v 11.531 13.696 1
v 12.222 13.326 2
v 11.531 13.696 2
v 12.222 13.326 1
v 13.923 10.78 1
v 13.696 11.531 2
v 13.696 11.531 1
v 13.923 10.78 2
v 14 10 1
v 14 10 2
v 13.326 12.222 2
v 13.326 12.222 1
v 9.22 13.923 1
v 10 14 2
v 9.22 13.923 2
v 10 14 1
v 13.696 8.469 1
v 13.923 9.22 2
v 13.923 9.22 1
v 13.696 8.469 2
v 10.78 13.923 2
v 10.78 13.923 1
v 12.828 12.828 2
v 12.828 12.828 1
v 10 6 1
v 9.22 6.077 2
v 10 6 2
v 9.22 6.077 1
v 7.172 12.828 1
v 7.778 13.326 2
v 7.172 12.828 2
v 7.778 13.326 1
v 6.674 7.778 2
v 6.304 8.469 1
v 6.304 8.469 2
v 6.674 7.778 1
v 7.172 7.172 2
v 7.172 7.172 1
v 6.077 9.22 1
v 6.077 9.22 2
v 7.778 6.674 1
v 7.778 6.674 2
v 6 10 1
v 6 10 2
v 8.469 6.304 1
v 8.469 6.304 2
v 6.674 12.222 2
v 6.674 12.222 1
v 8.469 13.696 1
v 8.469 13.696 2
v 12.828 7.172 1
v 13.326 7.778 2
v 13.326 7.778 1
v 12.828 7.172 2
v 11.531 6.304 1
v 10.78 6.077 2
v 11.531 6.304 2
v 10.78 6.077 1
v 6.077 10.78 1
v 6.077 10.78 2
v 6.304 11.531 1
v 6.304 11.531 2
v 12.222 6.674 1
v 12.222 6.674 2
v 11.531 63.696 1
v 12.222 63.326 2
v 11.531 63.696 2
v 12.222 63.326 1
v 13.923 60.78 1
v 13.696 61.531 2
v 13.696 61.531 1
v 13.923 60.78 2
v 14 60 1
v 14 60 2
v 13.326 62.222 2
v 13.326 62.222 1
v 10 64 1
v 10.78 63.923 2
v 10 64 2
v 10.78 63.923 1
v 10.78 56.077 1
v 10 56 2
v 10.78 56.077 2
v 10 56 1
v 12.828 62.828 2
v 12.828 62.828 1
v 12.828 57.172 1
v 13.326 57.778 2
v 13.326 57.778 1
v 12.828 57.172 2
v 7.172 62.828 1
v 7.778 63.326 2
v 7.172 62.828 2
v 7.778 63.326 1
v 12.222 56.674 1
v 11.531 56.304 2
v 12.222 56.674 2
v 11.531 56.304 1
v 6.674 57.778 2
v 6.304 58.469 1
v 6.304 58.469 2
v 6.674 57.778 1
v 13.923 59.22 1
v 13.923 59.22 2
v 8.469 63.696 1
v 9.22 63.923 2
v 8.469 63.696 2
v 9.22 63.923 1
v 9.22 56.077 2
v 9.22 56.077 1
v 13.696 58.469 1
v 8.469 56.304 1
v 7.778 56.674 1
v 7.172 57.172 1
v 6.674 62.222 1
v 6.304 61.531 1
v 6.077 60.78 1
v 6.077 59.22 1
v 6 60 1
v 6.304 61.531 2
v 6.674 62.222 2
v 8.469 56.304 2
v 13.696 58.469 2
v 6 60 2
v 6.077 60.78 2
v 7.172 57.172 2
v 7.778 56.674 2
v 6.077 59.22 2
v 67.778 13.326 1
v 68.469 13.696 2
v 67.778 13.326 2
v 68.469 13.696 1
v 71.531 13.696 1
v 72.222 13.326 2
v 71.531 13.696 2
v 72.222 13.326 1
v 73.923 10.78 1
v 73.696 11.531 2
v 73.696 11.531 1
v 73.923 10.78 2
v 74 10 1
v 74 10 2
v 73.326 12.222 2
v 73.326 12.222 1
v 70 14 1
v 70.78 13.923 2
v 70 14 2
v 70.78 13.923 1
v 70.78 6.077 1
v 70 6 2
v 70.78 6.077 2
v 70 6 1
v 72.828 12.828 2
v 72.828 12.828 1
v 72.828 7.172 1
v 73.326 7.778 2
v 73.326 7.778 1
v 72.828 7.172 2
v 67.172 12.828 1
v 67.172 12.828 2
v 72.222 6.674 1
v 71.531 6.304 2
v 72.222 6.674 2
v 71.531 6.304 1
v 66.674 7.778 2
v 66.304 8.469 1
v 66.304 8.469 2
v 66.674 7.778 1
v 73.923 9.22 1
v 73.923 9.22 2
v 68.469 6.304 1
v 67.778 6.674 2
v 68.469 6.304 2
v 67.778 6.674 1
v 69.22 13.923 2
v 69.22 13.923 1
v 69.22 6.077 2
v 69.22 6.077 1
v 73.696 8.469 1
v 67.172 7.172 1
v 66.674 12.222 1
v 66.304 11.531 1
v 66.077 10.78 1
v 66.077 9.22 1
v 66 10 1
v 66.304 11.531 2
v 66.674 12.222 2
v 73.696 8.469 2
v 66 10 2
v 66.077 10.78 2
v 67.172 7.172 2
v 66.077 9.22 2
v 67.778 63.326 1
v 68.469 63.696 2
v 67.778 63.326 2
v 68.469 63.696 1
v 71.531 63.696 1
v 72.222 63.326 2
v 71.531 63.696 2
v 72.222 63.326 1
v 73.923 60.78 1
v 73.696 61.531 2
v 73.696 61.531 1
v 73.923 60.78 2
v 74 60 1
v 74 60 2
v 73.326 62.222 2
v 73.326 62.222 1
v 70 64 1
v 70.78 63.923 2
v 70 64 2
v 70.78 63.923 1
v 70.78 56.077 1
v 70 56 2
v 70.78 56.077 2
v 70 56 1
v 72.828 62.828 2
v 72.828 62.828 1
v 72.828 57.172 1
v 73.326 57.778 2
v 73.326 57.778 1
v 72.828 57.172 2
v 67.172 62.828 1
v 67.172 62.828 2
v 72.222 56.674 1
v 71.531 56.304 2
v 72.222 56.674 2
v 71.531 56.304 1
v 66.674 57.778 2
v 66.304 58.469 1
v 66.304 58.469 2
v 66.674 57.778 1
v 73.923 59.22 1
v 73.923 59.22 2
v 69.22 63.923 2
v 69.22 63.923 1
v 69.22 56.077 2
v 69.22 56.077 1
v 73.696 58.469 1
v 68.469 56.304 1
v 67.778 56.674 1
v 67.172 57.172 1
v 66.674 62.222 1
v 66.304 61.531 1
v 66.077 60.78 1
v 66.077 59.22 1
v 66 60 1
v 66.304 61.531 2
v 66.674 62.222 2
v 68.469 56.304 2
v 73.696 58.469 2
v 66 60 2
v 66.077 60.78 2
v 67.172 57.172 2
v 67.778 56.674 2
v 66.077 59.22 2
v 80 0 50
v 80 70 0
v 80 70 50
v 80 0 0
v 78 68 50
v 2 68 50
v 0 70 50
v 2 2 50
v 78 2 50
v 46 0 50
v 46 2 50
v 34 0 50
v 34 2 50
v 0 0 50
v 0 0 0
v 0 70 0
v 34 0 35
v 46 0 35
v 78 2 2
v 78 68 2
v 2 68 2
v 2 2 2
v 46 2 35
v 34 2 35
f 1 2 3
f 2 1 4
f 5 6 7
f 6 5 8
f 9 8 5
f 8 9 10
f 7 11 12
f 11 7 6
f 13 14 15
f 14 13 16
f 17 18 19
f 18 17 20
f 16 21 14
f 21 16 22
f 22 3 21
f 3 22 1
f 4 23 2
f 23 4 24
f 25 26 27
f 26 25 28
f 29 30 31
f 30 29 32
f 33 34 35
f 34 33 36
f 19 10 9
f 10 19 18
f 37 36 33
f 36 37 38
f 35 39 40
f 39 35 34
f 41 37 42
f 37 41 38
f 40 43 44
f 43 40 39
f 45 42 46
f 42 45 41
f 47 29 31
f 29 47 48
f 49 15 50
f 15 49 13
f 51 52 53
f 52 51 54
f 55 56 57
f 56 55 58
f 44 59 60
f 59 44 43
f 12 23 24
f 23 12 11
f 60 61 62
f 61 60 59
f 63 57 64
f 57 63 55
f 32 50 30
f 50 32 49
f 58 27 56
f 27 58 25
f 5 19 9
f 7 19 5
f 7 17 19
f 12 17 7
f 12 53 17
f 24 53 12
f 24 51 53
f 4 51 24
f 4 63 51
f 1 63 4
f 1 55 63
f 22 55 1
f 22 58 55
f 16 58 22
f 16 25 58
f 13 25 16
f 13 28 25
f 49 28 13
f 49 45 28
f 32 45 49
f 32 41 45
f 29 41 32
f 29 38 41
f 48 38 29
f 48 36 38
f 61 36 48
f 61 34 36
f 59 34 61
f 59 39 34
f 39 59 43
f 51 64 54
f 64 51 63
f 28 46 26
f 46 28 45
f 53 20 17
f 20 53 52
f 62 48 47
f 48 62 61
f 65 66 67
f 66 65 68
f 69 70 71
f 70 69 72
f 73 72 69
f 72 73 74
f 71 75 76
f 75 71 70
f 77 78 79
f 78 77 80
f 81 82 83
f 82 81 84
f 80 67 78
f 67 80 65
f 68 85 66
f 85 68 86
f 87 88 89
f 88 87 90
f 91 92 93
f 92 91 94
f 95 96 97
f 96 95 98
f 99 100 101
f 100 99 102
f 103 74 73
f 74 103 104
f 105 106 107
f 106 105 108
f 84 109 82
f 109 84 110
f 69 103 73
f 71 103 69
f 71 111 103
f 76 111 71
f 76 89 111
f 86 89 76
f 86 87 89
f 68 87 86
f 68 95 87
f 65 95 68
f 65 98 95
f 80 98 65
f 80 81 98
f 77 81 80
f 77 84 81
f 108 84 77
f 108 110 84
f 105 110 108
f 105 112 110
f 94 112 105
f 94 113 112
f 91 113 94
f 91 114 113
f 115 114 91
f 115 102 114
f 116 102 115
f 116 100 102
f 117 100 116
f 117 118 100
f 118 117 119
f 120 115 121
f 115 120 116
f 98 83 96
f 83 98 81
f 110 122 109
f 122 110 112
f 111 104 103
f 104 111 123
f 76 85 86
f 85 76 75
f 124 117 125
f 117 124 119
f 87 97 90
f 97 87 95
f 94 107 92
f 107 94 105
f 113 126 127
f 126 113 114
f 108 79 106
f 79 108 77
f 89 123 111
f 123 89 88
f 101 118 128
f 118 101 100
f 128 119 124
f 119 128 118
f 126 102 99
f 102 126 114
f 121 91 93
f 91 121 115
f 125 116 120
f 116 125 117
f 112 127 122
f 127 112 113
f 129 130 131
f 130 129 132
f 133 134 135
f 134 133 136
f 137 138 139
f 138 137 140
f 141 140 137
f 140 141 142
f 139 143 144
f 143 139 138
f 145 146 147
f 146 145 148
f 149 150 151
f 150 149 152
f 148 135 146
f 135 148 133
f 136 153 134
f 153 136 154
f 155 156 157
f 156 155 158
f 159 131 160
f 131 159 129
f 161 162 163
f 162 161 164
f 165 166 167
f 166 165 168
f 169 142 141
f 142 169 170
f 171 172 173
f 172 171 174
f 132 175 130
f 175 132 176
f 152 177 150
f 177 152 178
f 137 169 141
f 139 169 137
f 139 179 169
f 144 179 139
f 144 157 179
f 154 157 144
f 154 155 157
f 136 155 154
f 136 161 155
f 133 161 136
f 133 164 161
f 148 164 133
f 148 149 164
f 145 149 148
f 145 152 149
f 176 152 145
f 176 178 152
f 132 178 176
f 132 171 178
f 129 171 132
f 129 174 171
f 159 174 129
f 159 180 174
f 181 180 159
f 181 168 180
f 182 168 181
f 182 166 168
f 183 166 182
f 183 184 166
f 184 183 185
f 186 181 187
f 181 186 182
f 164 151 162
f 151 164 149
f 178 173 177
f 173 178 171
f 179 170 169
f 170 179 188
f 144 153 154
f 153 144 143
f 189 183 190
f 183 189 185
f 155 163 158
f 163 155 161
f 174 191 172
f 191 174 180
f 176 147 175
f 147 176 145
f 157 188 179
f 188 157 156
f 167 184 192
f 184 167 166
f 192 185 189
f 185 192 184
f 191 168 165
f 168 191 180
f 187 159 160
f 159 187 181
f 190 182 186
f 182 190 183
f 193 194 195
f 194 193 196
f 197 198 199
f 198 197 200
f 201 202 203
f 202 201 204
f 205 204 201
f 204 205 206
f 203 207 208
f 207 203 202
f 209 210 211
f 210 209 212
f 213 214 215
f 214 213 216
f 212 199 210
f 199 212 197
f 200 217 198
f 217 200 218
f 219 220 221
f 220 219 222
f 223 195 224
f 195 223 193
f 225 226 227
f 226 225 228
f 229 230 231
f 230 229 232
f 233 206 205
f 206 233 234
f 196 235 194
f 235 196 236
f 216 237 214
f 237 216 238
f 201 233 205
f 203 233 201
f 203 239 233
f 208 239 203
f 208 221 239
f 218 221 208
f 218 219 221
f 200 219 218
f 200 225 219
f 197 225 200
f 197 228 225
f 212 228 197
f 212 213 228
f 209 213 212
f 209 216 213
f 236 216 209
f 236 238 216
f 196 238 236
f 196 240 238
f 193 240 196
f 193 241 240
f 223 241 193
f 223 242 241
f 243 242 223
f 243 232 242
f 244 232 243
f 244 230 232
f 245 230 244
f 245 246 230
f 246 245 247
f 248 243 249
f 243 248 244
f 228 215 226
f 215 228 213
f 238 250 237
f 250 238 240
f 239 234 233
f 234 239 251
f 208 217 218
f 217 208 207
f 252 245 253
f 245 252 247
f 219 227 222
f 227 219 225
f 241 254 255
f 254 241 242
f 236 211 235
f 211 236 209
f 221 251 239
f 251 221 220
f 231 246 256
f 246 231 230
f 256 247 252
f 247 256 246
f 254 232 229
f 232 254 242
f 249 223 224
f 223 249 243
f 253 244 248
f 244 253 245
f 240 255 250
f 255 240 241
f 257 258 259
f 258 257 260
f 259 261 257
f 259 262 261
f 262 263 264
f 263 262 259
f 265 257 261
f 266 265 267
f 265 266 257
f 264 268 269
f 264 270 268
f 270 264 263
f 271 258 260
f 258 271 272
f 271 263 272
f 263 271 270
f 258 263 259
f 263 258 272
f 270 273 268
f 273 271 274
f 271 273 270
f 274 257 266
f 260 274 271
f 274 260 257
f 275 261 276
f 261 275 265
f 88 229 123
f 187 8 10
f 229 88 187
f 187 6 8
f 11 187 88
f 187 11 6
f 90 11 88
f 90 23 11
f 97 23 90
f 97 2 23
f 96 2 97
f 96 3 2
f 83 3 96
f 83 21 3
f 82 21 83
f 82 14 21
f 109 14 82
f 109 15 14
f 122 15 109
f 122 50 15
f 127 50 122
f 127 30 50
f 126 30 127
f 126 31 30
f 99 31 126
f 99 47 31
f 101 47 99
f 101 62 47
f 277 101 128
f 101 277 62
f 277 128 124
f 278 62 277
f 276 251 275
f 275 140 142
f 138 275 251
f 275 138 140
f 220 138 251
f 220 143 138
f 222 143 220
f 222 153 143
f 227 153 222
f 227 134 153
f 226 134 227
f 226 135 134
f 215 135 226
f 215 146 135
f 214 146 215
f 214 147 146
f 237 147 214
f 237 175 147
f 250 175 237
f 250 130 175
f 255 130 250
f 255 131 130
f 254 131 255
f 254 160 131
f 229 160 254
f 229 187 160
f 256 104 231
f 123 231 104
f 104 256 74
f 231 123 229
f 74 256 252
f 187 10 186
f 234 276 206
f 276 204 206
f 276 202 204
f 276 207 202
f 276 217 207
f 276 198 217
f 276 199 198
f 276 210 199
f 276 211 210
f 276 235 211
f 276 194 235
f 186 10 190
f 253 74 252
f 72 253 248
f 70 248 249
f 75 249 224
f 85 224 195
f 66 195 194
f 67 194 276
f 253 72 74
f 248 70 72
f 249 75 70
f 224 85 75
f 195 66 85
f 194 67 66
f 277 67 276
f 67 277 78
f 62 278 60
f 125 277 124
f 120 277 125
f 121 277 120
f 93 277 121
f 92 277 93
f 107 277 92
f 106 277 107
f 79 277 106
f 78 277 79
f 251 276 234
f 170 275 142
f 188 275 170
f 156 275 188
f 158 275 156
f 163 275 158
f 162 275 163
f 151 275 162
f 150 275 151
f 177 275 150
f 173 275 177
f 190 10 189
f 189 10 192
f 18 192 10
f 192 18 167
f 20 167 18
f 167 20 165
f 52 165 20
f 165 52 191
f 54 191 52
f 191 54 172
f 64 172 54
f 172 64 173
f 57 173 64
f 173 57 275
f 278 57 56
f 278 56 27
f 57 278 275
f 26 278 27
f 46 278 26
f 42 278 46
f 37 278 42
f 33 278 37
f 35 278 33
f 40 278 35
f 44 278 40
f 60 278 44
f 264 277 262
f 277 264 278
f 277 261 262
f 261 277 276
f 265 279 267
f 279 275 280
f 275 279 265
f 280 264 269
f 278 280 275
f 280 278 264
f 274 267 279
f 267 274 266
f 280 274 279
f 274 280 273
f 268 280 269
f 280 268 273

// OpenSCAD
$fn = 32;

// ----------------------------------------------------------------------
// Enclosure box: both enclosure
// ----------------------------------------------------------------------

// --- parameters (mm) ---
box_l = 80;               // outer length, X
box_w = 70;               // outer width, Y
box_h = 50;               // outer height
wall_t = 2;               // wall thickness
boss_r = 4;               // corner boss radius
hole_r = 1.5;             // boss screw hole radius
boss_in = 10;             // boss inset from the corners
notch_w = 12;             // cable notch width
notch_h = 15;             // cable notch height

inner_h = box_h - wall_t;  // cavity depth
boss_h = inner_h - 2;  // corner boss height

difference() {
  cube([box_l, box_w, box_h]);
  translate([wall_t, wall_t, wall_t])
    cube([box_l - 2 * wall_t, box_w - 2 * wall_t, box_h]);
  for (sx = [0, 1], sy = [0, 1])
    translate([sx ? box_l - boss_in : boss_in,
               sy ? box_w - boss_in : boss_in, wall_t - 1]) {
      cylinder(r = boss_r, h = boss_h);
      translate([0, 0, boss_h - 4])
        cylinder(r = hole_r, h = 5);
    }
  translate([box_l / 2 - notch_w / 2, -1, box_h - notch_h])
    cube([notch_w, wall_t + 2, notch_h + 1]);
}
